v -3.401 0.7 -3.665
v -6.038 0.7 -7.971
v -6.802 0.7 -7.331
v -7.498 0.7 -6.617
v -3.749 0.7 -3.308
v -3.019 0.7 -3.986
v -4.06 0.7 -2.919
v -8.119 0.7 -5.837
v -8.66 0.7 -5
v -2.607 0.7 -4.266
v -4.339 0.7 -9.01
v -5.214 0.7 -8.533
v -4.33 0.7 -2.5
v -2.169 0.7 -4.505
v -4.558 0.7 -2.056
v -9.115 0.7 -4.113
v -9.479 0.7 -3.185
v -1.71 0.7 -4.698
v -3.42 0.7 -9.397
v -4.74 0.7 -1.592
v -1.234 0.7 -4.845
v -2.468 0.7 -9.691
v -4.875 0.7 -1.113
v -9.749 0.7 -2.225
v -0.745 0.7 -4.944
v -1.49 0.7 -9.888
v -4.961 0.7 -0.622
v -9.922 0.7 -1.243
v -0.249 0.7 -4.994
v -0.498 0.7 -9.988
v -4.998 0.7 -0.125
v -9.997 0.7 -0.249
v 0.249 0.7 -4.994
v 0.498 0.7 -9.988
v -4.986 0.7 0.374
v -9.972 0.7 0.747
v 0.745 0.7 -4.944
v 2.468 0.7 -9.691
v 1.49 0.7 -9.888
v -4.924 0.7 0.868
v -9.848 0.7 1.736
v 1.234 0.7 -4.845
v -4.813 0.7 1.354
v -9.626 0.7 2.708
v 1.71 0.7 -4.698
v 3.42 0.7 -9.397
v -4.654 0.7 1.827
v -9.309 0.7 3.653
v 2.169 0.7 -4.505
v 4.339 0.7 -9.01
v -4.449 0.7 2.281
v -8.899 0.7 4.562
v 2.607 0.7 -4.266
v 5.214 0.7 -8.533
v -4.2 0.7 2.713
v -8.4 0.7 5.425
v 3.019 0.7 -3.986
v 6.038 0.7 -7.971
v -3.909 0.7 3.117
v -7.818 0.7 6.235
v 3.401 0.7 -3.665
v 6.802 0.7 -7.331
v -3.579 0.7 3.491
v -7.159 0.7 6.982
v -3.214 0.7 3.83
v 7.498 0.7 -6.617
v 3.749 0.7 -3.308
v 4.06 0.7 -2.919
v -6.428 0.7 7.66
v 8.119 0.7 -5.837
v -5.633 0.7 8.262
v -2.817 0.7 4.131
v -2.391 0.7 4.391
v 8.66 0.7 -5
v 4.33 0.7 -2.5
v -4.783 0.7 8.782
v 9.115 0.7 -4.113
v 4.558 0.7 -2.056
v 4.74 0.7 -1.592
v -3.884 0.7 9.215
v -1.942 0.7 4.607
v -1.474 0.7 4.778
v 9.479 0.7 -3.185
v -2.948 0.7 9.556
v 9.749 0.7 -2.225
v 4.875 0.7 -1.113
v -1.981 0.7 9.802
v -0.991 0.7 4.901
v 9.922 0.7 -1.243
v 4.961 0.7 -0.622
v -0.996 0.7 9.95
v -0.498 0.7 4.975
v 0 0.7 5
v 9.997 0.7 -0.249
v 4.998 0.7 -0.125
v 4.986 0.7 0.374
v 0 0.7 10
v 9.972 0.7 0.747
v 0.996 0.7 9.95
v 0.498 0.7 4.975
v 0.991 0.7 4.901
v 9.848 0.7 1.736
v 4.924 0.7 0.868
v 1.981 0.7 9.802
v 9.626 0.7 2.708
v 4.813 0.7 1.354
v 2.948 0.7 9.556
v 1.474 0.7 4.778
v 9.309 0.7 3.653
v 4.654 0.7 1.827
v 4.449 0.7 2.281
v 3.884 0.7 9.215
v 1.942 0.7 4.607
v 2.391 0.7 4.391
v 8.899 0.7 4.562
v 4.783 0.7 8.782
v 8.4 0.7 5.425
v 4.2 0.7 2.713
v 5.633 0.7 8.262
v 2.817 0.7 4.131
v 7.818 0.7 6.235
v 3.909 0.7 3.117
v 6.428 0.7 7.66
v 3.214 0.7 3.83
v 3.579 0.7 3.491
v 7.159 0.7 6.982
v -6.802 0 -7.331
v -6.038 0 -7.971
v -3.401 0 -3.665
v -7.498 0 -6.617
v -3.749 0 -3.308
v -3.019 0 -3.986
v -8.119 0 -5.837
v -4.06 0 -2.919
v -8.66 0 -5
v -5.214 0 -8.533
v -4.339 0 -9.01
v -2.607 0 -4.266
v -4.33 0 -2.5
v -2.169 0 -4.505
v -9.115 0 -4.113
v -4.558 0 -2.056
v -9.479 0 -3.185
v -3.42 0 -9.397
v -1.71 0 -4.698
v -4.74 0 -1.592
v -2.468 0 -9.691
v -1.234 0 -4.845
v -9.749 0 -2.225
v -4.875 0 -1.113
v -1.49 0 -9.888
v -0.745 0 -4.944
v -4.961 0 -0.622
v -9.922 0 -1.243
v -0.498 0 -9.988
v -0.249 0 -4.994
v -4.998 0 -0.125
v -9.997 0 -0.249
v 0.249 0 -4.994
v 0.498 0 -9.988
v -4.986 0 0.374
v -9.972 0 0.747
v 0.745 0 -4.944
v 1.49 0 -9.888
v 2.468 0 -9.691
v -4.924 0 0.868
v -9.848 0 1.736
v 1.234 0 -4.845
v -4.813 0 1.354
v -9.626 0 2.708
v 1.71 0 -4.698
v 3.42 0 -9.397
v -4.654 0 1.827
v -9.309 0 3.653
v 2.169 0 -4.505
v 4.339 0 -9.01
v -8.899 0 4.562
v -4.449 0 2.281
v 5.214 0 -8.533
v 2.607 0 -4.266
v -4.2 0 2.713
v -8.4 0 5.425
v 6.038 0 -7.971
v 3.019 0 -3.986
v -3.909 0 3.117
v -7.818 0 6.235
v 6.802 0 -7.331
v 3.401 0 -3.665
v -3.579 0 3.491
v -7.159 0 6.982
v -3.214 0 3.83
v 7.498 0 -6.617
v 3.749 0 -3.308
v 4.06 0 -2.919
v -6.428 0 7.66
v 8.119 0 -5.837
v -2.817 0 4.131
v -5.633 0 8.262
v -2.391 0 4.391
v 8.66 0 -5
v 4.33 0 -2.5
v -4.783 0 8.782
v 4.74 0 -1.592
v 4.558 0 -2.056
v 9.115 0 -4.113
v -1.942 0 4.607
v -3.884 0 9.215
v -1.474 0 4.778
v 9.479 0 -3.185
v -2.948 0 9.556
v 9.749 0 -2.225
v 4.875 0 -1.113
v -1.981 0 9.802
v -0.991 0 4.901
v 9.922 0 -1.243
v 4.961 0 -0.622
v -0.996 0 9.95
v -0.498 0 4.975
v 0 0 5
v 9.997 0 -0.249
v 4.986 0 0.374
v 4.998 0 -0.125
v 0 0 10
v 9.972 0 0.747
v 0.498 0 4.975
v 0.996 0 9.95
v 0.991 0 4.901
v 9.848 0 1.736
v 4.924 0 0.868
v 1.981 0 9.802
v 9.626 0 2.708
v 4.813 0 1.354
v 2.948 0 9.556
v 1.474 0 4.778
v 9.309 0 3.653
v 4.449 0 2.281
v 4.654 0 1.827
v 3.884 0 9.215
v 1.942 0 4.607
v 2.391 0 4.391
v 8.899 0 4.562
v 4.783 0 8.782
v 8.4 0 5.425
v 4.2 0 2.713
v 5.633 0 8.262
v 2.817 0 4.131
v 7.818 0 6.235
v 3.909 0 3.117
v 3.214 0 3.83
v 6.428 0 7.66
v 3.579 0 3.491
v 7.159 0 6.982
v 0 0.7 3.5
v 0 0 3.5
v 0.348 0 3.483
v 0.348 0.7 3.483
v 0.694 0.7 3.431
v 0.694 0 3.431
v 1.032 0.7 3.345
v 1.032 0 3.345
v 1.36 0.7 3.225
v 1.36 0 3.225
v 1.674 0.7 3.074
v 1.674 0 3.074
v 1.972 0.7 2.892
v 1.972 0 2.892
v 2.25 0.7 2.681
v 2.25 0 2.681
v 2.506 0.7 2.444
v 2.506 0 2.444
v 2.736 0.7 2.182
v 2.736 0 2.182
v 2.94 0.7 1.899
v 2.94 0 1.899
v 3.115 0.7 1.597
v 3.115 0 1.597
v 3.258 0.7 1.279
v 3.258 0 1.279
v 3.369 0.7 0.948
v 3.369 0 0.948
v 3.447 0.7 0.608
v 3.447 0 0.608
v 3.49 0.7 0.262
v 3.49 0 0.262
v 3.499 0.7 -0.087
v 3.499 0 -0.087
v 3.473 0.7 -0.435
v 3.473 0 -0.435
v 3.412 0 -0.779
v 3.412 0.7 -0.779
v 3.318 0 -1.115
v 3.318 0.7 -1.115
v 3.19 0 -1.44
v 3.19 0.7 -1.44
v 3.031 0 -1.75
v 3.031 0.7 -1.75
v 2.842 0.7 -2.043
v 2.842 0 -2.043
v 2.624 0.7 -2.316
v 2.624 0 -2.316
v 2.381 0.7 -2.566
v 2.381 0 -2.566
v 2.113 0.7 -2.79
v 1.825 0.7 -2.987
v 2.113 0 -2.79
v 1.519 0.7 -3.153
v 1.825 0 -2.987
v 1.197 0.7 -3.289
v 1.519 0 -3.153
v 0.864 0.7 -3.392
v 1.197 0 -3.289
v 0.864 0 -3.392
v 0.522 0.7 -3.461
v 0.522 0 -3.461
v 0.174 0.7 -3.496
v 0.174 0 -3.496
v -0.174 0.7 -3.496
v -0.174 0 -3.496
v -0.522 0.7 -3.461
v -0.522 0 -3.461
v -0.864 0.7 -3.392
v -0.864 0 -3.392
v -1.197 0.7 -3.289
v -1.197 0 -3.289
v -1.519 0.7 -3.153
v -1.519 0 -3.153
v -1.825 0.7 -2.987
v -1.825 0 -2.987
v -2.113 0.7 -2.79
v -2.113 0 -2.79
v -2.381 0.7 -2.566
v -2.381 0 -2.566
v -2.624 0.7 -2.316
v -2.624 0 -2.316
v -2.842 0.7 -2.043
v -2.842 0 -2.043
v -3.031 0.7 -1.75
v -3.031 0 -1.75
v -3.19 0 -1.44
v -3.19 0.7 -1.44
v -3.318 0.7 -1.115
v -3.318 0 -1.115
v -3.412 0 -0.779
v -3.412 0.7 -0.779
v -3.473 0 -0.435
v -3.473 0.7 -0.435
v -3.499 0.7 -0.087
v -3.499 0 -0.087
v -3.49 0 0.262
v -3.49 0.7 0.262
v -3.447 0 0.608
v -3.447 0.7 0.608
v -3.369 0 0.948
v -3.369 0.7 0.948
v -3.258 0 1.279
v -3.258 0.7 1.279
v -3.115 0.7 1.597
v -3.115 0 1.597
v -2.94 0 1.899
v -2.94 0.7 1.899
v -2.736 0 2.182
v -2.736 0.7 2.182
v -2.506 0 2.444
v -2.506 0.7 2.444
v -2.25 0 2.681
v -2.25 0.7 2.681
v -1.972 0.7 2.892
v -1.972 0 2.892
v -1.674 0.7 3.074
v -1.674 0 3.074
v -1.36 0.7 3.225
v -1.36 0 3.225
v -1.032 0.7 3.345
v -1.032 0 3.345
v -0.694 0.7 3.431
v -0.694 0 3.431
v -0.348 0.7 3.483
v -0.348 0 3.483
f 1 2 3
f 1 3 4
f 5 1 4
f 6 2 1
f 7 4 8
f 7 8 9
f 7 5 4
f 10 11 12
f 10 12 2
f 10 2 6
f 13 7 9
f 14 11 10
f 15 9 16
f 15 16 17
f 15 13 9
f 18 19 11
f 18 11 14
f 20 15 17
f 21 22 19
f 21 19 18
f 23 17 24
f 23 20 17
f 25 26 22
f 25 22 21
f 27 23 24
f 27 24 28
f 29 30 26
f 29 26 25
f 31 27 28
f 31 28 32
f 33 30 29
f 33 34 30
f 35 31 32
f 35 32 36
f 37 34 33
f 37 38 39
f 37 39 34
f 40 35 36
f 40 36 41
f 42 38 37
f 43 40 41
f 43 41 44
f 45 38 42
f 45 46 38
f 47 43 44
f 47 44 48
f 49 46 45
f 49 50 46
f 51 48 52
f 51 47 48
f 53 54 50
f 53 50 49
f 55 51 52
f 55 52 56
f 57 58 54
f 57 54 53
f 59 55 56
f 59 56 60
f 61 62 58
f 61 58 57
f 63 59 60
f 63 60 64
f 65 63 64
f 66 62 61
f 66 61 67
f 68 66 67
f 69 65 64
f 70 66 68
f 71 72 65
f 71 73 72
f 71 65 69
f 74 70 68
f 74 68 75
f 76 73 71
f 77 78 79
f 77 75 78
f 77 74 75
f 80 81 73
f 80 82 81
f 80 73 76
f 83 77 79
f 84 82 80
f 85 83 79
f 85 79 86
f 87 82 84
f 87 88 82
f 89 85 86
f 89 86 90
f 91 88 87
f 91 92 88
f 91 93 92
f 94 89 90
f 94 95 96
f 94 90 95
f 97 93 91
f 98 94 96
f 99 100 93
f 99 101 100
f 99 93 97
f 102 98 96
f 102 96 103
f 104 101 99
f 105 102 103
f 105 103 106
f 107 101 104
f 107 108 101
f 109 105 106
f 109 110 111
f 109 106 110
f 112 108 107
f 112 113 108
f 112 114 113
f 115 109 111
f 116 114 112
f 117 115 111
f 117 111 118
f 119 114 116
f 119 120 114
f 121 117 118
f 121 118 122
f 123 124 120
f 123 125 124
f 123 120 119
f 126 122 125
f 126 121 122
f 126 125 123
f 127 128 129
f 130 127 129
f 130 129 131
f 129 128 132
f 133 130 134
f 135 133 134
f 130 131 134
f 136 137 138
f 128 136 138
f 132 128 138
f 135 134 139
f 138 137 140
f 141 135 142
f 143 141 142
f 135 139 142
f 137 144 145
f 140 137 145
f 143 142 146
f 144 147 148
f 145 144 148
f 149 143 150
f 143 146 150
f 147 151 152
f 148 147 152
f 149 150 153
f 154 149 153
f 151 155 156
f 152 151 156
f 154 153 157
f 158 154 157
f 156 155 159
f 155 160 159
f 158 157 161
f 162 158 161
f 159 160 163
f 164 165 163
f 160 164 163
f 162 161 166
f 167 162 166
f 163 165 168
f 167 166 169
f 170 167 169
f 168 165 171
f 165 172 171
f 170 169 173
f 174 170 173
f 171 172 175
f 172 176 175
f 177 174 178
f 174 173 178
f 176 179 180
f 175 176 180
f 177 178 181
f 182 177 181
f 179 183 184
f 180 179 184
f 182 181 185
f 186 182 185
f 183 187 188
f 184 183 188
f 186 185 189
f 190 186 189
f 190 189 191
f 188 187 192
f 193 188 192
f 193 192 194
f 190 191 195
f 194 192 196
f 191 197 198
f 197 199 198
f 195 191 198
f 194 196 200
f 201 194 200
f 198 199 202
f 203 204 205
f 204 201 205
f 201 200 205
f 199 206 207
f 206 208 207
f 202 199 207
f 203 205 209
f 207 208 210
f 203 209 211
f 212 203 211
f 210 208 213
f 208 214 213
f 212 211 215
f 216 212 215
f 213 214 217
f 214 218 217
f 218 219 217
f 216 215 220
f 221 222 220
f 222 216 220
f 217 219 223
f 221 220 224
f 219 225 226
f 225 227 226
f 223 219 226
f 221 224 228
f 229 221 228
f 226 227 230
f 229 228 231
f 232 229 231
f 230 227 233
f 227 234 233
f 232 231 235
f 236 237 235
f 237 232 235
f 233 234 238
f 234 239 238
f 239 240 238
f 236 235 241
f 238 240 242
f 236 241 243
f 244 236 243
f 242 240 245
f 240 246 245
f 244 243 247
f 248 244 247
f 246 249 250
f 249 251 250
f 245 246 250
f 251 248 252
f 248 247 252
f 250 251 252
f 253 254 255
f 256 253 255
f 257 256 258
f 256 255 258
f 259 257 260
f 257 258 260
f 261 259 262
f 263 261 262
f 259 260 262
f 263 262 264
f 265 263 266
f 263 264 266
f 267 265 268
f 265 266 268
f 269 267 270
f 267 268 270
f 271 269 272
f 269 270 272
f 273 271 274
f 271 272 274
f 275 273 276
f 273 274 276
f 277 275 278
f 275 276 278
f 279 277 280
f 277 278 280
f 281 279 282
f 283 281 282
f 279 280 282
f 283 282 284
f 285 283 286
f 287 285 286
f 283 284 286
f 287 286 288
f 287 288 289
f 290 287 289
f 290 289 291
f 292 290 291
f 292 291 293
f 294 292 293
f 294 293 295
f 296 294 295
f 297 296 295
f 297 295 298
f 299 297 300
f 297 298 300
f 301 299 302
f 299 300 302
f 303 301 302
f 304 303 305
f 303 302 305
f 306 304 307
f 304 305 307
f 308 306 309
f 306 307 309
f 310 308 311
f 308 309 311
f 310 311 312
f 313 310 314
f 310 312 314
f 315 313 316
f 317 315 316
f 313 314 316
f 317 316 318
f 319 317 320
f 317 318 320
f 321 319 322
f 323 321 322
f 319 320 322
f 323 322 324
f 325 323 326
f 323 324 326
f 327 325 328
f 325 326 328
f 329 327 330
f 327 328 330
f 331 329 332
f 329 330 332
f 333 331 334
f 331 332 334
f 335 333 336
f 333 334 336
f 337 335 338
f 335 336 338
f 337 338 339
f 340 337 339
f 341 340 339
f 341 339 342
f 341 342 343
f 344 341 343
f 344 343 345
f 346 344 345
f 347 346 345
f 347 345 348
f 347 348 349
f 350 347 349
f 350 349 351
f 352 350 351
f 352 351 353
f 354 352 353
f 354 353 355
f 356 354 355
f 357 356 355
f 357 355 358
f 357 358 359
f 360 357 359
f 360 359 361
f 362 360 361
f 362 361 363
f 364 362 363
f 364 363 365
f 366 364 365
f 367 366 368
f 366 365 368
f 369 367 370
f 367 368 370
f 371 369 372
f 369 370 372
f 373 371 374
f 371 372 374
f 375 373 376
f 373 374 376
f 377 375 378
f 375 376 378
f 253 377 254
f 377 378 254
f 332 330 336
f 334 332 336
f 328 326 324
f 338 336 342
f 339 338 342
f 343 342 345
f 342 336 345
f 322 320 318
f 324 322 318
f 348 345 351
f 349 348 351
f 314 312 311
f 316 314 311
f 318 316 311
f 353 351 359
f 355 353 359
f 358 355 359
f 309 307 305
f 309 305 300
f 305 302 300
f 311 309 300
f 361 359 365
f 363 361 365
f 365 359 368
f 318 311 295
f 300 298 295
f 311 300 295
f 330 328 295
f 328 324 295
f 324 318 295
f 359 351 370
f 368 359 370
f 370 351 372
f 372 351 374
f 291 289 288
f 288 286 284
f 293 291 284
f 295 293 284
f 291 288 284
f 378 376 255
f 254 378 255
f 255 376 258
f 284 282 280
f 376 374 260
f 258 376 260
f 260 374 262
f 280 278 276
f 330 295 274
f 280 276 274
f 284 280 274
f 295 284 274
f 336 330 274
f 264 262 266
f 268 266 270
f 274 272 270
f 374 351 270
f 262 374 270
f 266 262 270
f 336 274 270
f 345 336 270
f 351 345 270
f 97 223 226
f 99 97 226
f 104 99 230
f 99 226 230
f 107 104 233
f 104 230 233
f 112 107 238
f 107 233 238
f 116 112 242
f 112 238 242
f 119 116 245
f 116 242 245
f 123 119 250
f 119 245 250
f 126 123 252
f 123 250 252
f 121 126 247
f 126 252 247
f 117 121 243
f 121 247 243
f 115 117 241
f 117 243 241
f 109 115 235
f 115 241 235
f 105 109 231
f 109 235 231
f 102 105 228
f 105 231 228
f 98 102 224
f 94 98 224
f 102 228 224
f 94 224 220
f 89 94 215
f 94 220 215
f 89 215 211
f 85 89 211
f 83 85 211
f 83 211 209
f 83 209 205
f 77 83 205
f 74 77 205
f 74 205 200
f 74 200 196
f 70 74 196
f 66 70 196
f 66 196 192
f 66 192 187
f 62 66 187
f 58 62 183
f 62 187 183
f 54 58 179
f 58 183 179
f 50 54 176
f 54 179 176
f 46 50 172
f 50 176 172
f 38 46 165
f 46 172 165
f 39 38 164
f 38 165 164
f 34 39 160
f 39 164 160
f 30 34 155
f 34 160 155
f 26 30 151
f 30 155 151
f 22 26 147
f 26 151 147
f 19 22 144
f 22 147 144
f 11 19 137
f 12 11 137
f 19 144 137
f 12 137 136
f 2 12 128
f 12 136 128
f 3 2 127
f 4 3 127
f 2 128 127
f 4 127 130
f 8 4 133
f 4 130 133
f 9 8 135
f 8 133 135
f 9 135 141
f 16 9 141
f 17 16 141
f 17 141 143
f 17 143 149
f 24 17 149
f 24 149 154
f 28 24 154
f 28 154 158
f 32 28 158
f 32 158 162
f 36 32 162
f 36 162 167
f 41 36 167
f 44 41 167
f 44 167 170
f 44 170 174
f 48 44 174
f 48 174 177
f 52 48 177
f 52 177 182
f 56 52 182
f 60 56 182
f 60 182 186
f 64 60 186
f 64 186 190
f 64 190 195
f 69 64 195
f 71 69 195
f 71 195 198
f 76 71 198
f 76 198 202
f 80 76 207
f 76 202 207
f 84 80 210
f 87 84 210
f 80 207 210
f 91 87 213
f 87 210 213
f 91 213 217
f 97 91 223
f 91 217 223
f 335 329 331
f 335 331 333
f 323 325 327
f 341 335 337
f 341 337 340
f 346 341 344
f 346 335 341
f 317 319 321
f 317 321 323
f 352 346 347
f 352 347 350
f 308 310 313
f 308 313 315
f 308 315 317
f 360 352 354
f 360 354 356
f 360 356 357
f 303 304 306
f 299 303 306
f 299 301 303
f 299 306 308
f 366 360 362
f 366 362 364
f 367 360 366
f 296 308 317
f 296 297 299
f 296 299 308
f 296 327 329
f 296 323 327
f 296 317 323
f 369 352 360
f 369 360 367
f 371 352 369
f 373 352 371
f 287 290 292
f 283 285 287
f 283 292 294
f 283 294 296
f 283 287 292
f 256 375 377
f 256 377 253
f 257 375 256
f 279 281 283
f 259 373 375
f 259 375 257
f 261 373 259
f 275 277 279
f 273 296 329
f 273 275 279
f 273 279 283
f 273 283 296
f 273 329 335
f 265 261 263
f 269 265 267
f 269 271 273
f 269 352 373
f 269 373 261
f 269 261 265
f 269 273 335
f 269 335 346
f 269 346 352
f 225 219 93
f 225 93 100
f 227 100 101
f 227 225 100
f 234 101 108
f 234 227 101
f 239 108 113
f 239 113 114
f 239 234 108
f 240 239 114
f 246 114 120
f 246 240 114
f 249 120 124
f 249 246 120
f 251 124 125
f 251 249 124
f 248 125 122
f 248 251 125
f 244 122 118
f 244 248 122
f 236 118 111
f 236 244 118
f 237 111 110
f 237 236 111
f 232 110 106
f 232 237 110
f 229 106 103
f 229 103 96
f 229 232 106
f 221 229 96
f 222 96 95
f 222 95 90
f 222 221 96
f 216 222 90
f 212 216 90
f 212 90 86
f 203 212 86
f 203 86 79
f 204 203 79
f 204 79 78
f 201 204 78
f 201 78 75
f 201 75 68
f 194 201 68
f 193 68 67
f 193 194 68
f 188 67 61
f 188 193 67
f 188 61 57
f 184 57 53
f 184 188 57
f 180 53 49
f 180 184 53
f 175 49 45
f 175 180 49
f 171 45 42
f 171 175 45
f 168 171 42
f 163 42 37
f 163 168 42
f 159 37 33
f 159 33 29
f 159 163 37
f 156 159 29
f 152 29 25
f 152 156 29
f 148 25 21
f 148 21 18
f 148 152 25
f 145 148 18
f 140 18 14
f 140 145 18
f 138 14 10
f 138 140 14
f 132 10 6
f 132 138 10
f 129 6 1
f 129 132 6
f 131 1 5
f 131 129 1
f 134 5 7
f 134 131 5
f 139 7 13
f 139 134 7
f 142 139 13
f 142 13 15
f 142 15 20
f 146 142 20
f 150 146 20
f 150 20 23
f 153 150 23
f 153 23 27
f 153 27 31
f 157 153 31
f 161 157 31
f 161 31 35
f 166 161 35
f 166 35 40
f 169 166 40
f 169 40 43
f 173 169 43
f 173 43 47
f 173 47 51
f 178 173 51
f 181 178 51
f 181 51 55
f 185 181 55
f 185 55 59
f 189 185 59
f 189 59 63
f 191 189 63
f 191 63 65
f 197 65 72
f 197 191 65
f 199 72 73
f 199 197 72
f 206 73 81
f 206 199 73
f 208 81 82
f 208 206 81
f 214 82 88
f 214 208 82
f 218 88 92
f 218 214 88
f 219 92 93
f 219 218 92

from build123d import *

# Parameters (mm, degrees)
SKETCH1_R           = 10
SKETCH1_R_2         = 5
BOSS_EXTRUDE1_DEPTH = 0.7
SKETCH2_R           = 3.5
BOSS_EXTRUDE2_DEPTH = 0.7


with BuildPart() as part:
    # Sketch1 → Boss-Extrude1 (new body)
    with BuildSketch(Plane(origin=(0, 0, 0), x_dir=(1, 0, 0), z_dir=(0, 1, 0))):
        with Locations(Location((0, 0, 0), (0, 0, 270))):
            Circle(SKETCH1_R)
        with Locations(Location((0, 0, 0), (0, 0, 270))):
            Circle(SKETCH1_R_2, mode=Mode.SUBTRACT)
    extrude(amount=BOSS_EXTRUDE1_DEPTH)


with BuildPart() as body_2:
    # Sketch2 → Boss-Extrude2 (new body)
    with BuildSketch(Plane(origin=(0, 0, 0), x_dir=(1, 0, 0), z_dir=(0, 1, 0))):
        with Locations(Location((0, 0, 0), (0, 0, 270))):
            Circle(SKETCH2_R)
    extrude(amount=BOSS_EXTRUDE2_DEPTH)


solid = Compound([part.part, body_2.part])
